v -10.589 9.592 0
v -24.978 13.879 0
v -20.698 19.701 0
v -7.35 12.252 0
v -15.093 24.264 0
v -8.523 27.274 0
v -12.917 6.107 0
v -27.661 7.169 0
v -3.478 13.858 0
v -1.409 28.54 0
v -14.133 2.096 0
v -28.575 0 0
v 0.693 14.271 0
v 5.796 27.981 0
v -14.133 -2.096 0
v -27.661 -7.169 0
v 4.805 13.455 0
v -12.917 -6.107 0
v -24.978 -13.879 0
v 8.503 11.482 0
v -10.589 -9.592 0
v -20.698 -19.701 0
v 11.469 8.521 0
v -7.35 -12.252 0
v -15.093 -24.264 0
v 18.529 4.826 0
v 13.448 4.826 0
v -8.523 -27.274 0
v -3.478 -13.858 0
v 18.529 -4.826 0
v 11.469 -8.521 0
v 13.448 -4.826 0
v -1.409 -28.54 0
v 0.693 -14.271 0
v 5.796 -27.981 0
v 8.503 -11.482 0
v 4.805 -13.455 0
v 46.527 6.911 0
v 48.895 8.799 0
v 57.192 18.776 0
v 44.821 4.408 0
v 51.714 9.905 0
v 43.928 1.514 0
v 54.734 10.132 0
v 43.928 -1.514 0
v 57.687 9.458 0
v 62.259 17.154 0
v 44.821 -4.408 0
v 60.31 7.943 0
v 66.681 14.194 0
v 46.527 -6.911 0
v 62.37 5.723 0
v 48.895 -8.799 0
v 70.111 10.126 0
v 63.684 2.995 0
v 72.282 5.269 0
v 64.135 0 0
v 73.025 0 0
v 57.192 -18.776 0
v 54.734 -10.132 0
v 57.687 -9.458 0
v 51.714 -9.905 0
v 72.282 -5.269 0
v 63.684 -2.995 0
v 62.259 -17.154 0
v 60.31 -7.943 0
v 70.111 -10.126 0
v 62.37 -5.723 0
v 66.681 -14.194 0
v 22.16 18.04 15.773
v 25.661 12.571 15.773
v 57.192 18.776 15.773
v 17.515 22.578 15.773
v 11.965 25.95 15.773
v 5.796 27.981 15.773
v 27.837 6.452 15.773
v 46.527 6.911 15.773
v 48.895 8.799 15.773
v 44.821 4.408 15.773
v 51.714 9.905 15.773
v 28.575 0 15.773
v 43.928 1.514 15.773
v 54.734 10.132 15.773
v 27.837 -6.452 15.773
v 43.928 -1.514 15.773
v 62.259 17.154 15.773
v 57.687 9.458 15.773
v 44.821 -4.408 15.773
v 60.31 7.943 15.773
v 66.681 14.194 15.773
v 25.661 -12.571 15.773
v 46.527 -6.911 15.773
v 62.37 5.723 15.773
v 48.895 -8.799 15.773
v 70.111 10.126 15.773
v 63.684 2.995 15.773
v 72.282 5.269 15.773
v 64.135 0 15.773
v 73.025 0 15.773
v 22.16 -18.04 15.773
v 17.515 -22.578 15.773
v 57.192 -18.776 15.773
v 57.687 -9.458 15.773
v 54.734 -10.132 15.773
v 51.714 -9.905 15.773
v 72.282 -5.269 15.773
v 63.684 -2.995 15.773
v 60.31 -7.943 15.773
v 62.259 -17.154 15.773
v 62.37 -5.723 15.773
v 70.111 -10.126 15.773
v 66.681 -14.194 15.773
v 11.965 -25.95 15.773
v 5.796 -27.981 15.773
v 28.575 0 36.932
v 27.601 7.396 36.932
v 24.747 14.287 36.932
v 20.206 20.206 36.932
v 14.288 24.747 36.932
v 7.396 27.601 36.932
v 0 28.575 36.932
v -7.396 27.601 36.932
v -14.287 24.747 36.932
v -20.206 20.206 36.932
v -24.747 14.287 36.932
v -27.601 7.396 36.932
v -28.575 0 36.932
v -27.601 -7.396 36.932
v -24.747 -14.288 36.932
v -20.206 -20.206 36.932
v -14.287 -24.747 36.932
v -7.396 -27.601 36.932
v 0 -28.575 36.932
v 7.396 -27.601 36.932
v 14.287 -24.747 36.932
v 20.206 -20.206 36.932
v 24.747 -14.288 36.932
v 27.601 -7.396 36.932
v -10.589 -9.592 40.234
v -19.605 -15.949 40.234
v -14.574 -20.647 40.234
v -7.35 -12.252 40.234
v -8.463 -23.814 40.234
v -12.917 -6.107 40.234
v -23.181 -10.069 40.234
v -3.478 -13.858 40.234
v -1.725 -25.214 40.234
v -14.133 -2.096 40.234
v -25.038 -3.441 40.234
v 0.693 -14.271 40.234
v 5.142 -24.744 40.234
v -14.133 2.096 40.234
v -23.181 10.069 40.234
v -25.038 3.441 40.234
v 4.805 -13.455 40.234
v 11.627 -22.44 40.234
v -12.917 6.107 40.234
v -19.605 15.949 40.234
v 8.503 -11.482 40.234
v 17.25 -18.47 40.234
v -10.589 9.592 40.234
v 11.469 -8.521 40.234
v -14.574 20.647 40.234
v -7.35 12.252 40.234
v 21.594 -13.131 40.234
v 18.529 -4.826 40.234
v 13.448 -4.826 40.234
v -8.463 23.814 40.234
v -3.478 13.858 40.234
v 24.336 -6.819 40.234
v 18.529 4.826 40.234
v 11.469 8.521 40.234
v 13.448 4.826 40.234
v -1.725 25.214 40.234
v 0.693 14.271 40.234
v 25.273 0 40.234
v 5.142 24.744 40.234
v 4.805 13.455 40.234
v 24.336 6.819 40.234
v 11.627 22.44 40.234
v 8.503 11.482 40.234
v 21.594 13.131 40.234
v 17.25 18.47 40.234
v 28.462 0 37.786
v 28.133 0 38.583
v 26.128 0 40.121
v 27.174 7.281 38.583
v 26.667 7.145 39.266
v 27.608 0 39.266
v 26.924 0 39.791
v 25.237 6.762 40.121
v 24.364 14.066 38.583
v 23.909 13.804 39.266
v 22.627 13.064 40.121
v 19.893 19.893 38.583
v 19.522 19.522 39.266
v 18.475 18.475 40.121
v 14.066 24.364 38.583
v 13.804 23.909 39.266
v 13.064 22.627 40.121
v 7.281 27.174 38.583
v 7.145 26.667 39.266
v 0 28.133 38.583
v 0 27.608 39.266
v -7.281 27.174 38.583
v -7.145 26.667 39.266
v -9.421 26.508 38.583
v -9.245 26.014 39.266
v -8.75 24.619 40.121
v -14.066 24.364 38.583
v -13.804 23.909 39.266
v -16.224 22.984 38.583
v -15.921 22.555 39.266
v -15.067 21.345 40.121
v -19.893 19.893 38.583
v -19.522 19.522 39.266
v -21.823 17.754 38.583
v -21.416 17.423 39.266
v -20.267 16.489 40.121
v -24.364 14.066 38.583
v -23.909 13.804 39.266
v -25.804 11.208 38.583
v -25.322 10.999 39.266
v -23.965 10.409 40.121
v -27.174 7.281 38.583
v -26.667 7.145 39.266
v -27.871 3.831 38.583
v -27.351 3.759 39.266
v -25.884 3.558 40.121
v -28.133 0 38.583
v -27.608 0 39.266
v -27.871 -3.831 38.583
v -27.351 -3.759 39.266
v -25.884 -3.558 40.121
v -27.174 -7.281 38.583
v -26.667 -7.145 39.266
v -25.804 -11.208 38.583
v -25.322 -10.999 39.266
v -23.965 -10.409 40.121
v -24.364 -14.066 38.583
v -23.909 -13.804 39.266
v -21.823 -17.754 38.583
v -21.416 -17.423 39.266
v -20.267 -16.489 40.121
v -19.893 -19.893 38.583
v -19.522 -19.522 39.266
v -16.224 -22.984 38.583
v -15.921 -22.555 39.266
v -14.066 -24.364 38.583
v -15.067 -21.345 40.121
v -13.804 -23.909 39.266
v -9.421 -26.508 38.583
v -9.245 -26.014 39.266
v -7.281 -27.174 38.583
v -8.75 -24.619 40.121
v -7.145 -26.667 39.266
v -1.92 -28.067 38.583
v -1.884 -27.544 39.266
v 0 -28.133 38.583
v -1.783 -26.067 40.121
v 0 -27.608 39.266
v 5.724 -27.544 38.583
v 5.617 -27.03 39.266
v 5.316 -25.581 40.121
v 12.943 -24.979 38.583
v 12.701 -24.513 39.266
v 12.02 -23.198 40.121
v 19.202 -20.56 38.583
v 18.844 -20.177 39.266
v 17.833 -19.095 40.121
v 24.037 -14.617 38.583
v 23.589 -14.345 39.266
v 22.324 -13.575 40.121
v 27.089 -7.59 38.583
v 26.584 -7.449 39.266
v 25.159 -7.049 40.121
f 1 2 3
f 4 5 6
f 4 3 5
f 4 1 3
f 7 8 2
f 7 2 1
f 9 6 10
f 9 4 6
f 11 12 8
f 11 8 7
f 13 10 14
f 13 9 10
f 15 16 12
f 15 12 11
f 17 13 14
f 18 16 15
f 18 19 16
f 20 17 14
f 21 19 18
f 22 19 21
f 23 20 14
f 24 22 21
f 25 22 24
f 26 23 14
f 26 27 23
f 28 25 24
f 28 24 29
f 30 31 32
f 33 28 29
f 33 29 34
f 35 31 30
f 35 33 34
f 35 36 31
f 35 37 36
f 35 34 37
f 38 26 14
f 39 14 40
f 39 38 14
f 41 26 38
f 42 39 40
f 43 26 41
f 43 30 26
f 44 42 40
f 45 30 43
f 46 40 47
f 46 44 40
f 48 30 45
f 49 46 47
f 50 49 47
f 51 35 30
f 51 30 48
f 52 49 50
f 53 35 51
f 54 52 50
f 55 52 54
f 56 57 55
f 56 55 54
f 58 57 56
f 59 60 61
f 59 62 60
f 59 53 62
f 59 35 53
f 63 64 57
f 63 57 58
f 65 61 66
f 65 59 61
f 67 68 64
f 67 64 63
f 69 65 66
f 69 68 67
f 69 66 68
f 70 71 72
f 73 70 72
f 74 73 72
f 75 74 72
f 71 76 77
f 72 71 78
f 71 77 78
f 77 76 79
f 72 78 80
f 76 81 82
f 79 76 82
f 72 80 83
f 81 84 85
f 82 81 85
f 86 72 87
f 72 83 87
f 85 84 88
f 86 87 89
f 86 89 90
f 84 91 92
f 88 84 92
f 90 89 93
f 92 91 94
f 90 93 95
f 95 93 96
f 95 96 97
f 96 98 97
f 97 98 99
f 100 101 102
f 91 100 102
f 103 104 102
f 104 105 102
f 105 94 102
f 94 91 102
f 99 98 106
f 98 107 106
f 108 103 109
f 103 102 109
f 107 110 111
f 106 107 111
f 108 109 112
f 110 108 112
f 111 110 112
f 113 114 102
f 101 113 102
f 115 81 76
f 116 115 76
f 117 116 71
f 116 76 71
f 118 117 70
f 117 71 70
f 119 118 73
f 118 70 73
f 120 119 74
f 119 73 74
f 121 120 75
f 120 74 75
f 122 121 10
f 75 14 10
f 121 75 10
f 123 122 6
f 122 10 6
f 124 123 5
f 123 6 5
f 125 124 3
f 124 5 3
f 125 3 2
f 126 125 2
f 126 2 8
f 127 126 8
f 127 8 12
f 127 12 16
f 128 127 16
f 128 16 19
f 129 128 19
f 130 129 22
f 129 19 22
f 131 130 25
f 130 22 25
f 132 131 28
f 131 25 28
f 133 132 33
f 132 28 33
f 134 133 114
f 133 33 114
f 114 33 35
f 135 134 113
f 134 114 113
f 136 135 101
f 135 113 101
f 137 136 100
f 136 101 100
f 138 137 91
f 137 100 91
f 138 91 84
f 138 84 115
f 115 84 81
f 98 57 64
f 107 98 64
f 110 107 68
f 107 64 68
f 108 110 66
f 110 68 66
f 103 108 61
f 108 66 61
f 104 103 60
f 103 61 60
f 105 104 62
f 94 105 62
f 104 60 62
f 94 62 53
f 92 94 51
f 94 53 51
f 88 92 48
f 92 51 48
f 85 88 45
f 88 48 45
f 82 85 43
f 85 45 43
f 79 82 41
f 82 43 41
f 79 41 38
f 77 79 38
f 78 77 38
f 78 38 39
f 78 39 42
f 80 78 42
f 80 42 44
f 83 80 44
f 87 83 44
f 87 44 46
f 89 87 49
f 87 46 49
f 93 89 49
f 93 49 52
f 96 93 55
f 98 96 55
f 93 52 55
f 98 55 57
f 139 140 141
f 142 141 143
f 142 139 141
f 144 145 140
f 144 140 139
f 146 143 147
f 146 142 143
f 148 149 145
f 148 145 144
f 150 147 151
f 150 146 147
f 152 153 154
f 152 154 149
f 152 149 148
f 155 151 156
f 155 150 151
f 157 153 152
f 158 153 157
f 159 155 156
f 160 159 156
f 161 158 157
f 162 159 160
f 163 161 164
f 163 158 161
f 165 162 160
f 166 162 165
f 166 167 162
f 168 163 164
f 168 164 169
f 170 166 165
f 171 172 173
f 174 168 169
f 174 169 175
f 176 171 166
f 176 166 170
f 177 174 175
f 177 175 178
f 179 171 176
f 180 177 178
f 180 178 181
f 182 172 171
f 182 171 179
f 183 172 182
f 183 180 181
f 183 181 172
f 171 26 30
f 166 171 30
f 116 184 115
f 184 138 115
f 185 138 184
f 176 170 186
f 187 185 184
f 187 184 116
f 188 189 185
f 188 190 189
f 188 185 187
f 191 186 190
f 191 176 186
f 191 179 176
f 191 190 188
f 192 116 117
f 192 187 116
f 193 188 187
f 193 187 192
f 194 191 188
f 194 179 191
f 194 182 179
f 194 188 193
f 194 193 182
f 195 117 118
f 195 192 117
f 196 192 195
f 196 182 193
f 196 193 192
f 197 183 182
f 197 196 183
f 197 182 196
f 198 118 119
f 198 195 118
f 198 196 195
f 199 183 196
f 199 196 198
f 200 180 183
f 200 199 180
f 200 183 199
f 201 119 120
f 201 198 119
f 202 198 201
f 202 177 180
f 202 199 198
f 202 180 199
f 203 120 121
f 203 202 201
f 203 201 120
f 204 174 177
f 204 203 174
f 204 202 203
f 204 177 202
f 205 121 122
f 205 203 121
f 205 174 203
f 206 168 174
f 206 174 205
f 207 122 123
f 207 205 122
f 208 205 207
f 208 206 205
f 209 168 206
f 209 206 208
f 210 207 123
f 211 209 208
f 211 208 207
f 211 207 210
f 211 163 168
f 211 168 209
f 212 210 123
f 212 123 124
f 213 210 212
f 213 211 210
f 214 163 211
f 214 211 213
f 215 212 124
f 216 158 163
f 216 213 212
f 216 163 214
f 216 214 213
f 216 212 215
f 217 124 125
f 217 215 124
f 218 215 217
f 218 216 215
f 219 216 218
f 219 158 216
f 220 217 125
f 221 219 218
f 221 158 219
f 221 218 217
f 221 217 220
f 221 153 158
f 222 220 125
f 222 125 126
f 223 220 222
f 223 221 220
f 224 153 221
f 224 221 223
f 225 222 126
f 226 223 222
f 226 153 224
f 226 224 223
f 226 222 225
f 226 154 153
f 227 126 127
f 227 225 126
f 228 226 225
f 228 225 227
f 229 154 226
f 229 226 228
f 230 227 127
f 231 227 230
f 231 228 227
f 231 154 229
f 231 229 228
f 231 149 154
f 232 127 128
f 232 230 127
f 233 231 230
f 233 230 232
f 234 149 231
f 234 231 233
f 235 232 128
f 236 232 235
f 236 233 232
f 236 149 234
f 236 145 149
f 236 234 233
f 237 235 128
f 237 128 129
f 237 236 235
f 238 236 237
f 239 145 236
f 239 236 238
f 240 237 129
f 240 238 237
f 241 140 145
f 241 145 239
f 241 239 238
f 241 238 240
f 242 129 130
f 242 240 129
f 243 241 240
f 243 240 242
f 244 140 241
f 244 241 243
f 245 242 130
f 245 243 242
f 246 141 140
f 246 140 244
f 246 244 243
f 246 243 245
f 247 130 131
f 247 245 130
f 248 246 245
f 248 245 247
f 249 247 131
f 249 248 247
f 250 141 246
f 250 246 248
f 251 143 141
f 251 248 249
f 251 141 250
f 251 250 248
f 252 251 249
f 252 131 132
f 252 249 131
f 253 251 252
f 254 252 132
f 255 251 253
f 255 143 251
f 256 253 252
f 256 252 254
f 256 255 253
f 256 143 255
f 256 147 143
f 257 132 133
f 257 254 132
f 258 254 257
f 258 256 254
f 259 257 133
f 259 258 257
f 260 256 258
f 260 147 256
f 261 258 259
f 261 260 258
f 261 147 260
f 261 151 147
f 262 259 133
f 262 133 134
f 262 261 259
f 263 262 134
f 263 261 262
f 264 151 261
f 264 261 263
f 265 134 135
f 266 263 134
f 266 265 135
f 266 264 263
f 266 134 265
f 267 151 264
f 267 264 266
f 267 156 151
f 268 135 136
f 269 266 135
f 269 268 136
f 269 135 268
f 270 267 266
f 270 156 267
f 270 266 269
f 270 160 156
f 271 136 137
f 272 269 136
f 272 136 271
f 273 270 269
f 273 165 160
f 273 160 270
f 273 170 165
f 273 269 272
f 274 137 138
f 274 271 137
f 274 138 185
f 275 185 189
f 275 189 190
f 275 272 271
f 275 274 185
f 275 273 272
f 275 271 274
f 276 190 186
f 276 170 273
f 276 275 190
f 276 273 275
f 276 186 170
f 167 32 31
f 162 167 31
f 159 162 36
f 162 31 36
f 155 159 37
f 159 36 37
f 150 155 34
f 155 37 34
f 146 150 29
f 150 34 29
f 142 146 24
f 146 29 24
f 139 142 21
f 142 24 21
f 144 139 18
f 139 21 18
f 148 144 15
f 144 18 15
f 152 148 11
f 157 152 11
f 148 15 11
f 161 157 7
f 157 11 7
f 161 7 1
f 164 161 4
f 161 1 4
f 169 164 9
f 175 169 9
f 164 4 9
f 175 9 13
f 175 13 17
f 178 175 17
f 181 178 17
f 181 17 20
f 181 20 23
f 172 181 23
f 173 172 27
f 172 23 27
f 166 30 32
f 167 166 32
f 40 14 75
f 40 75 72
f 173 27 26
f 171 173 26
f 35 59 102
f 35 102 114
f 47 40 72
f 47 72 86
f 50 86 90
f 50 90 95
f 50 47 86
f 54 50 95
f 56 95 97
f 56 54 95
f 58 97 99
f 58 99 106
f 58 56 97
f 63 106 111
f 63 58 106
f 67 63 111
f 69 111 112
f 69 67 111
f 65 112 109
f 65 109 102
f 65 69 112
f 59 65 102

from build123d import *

# Parameters (mm, degrees)
F0_R     = 28.575
F1_DEPTH = 40.2336
F2_R     = 3.302
F3_R     = 10.16
F4_DEPTH = 15.7734


with BuildPart() as f1:
    # F0 (on Top) → F1 (new body)
    with BuildSketch(Plane.XY):
        Circle(F0_R)
        with BuildLine():
            ThreePointArc((13.4477648793, -4.826), (-14.2875, 0), (13.4477648793, 4.826))
            Line((13.4477648793, 4.826), (18.5293, 4.826))
            Line((18.5293, 4.826), (18.5293, -4.826))
            Line((18.5293, -4.826), (13.4477648793, -4.826))
        make_face(mode=Mode.SUBTRACT)
    extrude(amount=F1_DEPTH)

    # F2
    f2_edges = [f1.edges().sort_by_distance(p)[0] for p in [
        (-28.575, 0, 40.2336),
    ]]
    fillet(f2_edges, radius=F2_R)

    # F3 (on face) → F4 (join)
    with BuildSketch(Plane(origin=(0, 0, 0), x_dir=(1, 0, 0), z_dir=(0, 0, -1))):
        with BuildLine():
            Line((5.7964106128, -27.9809265216), (57.1919272622, -18.7764181619))
            ThreePointArc((57.1919272622, -18.7764181619), (73.025, 0), (57.1919272622, 18.7764181619))
            Line((57.1919272622, 18.7764181619), (5.7964106128, 27.9809265216))
            ThreePointArc((5.7964106128, 27.9809265216), (22.1603594089, 18.0402077557), (28.575, 0))
            ThreePointArc((28.575, 0), (22.1603594089, -18.0402077557), (5.7964106128, -27.9809265216))
        make_face()
        with Locations((53.975, 0)):
            Circle(F3_R, mode=Mode.SUBTRACT)
    extrude(amount=-F4_DEPTH)


solid = f1.part
